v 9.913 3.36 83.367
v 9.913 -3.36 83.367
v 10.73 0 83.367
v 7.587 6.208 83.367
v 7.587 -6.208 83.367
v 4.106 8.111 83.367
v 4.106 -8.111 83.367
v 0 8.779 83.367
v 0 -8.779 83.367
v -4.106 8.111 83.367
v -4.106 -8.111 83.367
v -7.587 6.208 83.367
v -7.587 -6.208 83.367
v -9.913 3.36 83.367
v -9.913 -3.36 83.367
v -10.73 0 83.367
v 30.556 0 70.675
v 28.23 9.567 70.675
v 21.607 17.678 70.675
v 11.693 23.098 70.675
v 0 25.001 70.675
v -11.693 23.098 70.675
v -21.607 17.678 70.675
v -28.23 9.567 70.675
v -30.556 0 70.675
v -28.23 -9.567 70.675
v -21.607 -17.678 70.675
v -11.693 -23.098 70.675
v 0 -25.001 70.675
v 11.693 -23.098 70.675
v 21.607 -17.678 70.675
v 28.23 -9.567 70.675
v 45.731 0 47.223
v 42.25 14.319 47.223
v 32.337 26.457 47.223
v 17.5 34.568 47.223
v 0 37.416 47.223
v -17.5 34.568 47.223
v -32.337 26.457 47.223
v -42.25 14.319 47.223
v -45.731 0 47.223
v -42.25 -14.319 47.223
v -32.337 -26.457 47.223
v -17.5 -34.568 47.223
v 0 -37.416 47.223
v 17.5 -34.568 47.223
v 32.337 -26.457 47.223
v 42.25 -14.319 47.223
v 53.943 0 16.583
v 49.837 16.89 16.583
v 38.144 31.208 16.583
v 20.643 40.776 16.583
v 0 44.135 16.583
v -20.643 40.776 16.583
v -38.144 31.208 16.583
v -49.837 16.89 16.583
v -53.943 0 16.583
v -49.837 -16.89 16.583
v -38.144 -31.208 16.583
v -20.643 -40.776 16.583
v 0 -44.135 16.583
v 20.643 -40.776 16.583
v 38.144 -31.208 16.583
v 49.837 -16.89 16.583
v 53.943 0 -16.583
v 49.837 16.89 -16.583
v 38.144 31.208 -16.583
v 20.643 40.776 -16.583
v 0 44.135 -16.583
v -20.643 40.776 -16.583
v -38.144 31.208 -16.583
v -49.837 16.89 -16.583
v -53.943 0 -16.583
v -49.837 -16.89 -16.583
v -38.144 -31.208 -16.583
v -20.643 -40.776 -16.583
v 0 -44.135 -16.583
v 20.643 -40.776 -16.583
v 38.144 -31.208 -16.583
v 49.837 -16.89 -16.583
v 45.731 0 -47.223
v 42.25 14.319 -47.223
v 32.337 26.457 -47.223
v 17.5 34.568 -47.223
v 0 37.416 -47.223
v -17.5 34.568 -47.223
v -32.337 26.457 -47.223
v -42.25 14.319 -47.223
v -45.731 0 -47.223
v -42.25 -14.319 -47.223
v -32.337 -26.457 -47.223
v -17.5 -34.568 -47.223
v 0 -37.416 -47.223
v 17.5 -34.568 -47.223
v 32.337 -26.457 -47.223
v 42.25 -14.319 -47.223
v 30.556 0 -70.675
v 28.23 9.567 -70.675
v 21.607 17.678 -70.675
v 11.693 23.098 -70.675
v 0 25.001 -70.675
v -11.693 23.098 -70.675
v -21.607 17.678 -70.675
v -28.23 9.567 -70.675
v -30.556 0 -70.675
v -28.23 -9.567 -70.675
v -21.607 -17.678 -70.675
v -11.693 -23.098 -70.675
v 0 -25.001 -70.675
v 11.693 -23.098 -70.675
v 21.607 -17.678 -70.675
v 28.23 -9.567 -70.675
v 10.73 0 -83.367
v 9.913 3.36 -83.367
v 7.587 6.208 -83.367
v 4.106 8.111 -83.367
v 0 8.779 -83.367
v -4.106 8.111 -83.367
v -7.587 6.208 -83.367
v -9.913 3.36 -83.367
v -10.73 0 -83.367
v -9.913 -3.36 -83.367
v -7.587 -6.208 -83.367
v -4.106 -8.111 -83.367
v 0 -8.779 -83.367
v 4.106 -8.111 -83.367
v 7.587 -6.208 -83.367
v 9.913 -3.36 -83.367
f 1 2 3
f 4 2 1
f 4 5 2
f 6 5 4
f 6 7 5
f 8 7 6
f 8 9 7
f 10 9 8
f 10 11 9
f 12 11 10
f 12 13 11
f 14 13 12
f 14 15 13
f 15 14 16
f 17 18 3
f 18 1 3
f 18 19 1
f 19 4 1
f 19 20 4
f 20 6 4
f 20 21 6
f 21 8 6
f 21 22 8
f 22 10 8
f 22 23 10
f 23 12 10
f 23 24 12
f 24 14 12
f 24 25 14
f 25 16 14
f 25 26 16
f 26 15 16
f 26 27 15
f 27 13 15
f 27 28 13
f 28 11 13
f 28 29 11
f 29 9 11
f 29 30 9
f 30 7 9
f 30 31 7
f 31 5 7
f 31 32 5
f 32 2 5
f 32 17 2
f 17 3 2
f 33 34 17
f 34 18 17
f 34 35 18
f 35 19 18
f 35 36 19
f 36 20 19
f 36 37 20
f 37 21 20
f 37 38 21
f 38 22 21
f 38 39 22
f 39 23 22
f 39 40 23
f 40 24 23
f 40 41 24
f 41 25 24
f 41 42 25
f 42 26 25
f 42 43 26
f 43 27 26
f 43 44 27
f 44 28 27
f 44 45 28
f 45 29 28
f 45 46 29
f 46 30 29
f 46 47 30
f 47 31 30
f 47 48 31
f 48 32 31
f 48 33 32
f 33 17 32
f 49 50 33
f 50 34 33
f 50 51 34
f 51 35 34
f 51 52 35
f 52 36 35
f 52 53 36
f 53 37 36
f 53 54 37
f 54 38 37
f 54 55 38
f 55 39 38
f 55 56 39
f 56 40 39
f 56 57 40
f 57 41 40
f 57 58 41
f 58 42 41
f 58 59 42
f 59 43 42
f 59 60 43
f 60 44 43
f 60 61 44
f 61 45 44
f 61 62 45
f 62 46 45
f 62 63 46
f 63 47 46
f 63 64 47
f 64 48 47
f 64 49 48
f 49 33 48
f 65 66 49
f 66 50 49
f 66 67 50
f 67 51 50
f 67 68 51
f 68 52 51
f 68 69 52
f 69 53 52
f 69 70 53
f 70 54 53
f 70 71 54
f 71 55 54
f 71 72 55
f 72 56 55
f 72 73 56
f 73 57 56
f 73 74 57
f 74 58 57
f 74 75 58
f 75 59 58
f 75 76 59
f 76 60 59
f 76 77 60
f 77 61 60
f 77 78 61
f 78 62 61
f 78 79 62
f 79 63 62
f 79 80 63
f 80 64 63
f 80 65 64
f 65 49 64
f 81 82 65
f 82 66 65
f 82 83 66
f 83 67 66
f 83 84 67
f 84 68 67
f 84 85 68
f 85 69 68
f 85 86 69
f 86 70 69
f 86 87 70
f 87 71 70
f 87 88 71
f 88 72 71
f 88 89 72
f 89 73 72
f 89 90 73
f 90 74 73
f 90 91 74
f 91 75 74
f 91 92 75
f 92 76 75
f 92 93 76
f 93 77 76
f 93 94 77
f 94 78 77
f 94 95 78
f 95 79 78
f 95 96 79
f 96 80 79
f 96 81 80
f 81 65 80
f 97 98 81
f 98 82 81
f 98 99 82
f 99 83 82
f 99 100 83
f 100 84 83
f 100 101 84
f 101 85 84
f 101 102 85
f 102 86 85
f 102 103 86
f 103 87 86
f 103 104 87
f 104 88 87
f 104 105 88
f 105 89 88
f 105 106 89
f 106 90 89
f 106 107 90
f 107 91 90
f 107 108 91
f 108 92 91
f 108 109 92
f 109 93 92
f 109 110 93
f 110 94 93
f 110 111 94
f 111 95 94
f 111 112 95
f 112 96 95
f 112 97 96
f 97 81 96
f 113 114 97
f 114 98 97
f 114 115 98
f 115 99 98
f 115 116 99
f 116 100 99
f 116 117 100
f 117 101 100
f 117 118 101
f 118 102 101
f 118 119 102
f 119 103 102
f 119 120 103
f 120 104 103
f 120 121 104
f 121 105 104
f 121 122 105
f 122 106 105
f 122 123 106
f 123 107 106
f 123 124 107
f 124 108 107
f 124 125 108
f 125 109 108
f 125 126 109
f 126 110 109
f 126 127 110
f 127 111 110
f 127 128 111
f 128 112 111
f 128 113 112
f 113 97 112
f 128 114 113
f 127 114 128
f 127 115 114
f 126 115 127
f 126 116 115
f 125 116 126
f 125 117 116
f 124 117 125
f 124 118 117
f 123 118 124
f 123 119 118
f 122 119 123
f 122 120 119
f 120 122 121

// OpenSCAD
// Generated by SolidPython 1.0.1 on 2020-07-29 00:46:49


scale(v = [11, 9, 17]) {
	sphere(r = 5);
}
/***********************************************
*********      SolidPython code:      **********
************************************************
 
# import packages: SolidPython
from solid import *
from solid.utils import *
from itertools import chain, combinations, permutations


class Resize:

    def __init__(self, scad_file):
        self.scad_file = scad_file
        #self.scad_file = import_scad(scad_file)
        # cone/cylinder param:
        self.r1 = 0
        self.r2 = 0
        self.h = 0
        # rectangular prism param:
        self.w = 0
        self.l = 0
        # ellipse param:
        self.r = 0

    # import OpenScad code (file name corresponds to shape)


    # classify shape + parameters
    def assign(self, param1, param2, param3):
        if self.scad_file == 'cone.scad':
            self.r1 = param1
            self.r2 = param2
            self.h = param3
        elif self.scad_file == 'cylinder.scad':
            self.r1 = param1
            self.r2 = param2
            self.h = param3
        elif self.scad_file == 'rectangularPrism.scad':
            self.h = param1
            self.l = param2
            self.w = param3
        else:
            self.r = param1
            self.h = param2

    # resize parameters
    def iterate(self):
        x = range(3, 20, 2)
        i = 1
        if self.scad_file == 'cone.scad':
            tempList = list(permutations(x, 2))
            for temp in tempList:
                param1 = temp[0]
                param2 = temp[1]
                filepath = 'produced_scad_files/' + 'cone' + str(param1) + '_' + str(param2) + '_' + '.scad'
                scad_render_to_file(cylinder(h=param1, r1=param2, r2=0), filepath)

        elif self.scad_file == 'cylinder.scad':
            tempList = list(permutations(x, 3))
            for temp in tempList:
                param1 = temp[0]
                param2 = temp[1]
                filepath = 'produced_scad_files/' + 'cylinder' + str(param1) + '_' + str(param2) + '_' + '.scad'
                scad_render_to_file(cylinder(h=param1, r1=param2, r2=param2), filepath)

        elif self.scad_file == 'rectangularPrism.scad':
            tempList = list(permutations(x, 3))
            for temp in tempList:
                param1 = temp[0]
                param2 = temp[1]
                param3 = temp[2]
                filepath = 'produced_scad_files/' + 'rectangularPrism' + str(param1) + '_' + str(param2) + '_' + str(
                    param3) + '.scad'
                scad_render_to_file(cube(size=(param1, param2, param3)), filepath)

        elif self.scad_file == 'ellipse.scad':
            tempList = list(permutations(x, 4))
            for temp in tempList:
                param1 = temp[0]
                param2 = temp[1]
                param3 = temp[2]
                param4 = temp[3]
                filepath = 'produced_scad_files/' + 'ellipse' + str(param1) + '_' + str(param2) + '_' + str(param3) + '_' + str(param4) + '.scad'
                scad_render_to_file(scale([param1, param2, param3])(sphere(r=param4)), filepath)

    def render_to_scadfile(self):
        scad_render_to_file(scad, 'example.scad') 
 
************************************************/
